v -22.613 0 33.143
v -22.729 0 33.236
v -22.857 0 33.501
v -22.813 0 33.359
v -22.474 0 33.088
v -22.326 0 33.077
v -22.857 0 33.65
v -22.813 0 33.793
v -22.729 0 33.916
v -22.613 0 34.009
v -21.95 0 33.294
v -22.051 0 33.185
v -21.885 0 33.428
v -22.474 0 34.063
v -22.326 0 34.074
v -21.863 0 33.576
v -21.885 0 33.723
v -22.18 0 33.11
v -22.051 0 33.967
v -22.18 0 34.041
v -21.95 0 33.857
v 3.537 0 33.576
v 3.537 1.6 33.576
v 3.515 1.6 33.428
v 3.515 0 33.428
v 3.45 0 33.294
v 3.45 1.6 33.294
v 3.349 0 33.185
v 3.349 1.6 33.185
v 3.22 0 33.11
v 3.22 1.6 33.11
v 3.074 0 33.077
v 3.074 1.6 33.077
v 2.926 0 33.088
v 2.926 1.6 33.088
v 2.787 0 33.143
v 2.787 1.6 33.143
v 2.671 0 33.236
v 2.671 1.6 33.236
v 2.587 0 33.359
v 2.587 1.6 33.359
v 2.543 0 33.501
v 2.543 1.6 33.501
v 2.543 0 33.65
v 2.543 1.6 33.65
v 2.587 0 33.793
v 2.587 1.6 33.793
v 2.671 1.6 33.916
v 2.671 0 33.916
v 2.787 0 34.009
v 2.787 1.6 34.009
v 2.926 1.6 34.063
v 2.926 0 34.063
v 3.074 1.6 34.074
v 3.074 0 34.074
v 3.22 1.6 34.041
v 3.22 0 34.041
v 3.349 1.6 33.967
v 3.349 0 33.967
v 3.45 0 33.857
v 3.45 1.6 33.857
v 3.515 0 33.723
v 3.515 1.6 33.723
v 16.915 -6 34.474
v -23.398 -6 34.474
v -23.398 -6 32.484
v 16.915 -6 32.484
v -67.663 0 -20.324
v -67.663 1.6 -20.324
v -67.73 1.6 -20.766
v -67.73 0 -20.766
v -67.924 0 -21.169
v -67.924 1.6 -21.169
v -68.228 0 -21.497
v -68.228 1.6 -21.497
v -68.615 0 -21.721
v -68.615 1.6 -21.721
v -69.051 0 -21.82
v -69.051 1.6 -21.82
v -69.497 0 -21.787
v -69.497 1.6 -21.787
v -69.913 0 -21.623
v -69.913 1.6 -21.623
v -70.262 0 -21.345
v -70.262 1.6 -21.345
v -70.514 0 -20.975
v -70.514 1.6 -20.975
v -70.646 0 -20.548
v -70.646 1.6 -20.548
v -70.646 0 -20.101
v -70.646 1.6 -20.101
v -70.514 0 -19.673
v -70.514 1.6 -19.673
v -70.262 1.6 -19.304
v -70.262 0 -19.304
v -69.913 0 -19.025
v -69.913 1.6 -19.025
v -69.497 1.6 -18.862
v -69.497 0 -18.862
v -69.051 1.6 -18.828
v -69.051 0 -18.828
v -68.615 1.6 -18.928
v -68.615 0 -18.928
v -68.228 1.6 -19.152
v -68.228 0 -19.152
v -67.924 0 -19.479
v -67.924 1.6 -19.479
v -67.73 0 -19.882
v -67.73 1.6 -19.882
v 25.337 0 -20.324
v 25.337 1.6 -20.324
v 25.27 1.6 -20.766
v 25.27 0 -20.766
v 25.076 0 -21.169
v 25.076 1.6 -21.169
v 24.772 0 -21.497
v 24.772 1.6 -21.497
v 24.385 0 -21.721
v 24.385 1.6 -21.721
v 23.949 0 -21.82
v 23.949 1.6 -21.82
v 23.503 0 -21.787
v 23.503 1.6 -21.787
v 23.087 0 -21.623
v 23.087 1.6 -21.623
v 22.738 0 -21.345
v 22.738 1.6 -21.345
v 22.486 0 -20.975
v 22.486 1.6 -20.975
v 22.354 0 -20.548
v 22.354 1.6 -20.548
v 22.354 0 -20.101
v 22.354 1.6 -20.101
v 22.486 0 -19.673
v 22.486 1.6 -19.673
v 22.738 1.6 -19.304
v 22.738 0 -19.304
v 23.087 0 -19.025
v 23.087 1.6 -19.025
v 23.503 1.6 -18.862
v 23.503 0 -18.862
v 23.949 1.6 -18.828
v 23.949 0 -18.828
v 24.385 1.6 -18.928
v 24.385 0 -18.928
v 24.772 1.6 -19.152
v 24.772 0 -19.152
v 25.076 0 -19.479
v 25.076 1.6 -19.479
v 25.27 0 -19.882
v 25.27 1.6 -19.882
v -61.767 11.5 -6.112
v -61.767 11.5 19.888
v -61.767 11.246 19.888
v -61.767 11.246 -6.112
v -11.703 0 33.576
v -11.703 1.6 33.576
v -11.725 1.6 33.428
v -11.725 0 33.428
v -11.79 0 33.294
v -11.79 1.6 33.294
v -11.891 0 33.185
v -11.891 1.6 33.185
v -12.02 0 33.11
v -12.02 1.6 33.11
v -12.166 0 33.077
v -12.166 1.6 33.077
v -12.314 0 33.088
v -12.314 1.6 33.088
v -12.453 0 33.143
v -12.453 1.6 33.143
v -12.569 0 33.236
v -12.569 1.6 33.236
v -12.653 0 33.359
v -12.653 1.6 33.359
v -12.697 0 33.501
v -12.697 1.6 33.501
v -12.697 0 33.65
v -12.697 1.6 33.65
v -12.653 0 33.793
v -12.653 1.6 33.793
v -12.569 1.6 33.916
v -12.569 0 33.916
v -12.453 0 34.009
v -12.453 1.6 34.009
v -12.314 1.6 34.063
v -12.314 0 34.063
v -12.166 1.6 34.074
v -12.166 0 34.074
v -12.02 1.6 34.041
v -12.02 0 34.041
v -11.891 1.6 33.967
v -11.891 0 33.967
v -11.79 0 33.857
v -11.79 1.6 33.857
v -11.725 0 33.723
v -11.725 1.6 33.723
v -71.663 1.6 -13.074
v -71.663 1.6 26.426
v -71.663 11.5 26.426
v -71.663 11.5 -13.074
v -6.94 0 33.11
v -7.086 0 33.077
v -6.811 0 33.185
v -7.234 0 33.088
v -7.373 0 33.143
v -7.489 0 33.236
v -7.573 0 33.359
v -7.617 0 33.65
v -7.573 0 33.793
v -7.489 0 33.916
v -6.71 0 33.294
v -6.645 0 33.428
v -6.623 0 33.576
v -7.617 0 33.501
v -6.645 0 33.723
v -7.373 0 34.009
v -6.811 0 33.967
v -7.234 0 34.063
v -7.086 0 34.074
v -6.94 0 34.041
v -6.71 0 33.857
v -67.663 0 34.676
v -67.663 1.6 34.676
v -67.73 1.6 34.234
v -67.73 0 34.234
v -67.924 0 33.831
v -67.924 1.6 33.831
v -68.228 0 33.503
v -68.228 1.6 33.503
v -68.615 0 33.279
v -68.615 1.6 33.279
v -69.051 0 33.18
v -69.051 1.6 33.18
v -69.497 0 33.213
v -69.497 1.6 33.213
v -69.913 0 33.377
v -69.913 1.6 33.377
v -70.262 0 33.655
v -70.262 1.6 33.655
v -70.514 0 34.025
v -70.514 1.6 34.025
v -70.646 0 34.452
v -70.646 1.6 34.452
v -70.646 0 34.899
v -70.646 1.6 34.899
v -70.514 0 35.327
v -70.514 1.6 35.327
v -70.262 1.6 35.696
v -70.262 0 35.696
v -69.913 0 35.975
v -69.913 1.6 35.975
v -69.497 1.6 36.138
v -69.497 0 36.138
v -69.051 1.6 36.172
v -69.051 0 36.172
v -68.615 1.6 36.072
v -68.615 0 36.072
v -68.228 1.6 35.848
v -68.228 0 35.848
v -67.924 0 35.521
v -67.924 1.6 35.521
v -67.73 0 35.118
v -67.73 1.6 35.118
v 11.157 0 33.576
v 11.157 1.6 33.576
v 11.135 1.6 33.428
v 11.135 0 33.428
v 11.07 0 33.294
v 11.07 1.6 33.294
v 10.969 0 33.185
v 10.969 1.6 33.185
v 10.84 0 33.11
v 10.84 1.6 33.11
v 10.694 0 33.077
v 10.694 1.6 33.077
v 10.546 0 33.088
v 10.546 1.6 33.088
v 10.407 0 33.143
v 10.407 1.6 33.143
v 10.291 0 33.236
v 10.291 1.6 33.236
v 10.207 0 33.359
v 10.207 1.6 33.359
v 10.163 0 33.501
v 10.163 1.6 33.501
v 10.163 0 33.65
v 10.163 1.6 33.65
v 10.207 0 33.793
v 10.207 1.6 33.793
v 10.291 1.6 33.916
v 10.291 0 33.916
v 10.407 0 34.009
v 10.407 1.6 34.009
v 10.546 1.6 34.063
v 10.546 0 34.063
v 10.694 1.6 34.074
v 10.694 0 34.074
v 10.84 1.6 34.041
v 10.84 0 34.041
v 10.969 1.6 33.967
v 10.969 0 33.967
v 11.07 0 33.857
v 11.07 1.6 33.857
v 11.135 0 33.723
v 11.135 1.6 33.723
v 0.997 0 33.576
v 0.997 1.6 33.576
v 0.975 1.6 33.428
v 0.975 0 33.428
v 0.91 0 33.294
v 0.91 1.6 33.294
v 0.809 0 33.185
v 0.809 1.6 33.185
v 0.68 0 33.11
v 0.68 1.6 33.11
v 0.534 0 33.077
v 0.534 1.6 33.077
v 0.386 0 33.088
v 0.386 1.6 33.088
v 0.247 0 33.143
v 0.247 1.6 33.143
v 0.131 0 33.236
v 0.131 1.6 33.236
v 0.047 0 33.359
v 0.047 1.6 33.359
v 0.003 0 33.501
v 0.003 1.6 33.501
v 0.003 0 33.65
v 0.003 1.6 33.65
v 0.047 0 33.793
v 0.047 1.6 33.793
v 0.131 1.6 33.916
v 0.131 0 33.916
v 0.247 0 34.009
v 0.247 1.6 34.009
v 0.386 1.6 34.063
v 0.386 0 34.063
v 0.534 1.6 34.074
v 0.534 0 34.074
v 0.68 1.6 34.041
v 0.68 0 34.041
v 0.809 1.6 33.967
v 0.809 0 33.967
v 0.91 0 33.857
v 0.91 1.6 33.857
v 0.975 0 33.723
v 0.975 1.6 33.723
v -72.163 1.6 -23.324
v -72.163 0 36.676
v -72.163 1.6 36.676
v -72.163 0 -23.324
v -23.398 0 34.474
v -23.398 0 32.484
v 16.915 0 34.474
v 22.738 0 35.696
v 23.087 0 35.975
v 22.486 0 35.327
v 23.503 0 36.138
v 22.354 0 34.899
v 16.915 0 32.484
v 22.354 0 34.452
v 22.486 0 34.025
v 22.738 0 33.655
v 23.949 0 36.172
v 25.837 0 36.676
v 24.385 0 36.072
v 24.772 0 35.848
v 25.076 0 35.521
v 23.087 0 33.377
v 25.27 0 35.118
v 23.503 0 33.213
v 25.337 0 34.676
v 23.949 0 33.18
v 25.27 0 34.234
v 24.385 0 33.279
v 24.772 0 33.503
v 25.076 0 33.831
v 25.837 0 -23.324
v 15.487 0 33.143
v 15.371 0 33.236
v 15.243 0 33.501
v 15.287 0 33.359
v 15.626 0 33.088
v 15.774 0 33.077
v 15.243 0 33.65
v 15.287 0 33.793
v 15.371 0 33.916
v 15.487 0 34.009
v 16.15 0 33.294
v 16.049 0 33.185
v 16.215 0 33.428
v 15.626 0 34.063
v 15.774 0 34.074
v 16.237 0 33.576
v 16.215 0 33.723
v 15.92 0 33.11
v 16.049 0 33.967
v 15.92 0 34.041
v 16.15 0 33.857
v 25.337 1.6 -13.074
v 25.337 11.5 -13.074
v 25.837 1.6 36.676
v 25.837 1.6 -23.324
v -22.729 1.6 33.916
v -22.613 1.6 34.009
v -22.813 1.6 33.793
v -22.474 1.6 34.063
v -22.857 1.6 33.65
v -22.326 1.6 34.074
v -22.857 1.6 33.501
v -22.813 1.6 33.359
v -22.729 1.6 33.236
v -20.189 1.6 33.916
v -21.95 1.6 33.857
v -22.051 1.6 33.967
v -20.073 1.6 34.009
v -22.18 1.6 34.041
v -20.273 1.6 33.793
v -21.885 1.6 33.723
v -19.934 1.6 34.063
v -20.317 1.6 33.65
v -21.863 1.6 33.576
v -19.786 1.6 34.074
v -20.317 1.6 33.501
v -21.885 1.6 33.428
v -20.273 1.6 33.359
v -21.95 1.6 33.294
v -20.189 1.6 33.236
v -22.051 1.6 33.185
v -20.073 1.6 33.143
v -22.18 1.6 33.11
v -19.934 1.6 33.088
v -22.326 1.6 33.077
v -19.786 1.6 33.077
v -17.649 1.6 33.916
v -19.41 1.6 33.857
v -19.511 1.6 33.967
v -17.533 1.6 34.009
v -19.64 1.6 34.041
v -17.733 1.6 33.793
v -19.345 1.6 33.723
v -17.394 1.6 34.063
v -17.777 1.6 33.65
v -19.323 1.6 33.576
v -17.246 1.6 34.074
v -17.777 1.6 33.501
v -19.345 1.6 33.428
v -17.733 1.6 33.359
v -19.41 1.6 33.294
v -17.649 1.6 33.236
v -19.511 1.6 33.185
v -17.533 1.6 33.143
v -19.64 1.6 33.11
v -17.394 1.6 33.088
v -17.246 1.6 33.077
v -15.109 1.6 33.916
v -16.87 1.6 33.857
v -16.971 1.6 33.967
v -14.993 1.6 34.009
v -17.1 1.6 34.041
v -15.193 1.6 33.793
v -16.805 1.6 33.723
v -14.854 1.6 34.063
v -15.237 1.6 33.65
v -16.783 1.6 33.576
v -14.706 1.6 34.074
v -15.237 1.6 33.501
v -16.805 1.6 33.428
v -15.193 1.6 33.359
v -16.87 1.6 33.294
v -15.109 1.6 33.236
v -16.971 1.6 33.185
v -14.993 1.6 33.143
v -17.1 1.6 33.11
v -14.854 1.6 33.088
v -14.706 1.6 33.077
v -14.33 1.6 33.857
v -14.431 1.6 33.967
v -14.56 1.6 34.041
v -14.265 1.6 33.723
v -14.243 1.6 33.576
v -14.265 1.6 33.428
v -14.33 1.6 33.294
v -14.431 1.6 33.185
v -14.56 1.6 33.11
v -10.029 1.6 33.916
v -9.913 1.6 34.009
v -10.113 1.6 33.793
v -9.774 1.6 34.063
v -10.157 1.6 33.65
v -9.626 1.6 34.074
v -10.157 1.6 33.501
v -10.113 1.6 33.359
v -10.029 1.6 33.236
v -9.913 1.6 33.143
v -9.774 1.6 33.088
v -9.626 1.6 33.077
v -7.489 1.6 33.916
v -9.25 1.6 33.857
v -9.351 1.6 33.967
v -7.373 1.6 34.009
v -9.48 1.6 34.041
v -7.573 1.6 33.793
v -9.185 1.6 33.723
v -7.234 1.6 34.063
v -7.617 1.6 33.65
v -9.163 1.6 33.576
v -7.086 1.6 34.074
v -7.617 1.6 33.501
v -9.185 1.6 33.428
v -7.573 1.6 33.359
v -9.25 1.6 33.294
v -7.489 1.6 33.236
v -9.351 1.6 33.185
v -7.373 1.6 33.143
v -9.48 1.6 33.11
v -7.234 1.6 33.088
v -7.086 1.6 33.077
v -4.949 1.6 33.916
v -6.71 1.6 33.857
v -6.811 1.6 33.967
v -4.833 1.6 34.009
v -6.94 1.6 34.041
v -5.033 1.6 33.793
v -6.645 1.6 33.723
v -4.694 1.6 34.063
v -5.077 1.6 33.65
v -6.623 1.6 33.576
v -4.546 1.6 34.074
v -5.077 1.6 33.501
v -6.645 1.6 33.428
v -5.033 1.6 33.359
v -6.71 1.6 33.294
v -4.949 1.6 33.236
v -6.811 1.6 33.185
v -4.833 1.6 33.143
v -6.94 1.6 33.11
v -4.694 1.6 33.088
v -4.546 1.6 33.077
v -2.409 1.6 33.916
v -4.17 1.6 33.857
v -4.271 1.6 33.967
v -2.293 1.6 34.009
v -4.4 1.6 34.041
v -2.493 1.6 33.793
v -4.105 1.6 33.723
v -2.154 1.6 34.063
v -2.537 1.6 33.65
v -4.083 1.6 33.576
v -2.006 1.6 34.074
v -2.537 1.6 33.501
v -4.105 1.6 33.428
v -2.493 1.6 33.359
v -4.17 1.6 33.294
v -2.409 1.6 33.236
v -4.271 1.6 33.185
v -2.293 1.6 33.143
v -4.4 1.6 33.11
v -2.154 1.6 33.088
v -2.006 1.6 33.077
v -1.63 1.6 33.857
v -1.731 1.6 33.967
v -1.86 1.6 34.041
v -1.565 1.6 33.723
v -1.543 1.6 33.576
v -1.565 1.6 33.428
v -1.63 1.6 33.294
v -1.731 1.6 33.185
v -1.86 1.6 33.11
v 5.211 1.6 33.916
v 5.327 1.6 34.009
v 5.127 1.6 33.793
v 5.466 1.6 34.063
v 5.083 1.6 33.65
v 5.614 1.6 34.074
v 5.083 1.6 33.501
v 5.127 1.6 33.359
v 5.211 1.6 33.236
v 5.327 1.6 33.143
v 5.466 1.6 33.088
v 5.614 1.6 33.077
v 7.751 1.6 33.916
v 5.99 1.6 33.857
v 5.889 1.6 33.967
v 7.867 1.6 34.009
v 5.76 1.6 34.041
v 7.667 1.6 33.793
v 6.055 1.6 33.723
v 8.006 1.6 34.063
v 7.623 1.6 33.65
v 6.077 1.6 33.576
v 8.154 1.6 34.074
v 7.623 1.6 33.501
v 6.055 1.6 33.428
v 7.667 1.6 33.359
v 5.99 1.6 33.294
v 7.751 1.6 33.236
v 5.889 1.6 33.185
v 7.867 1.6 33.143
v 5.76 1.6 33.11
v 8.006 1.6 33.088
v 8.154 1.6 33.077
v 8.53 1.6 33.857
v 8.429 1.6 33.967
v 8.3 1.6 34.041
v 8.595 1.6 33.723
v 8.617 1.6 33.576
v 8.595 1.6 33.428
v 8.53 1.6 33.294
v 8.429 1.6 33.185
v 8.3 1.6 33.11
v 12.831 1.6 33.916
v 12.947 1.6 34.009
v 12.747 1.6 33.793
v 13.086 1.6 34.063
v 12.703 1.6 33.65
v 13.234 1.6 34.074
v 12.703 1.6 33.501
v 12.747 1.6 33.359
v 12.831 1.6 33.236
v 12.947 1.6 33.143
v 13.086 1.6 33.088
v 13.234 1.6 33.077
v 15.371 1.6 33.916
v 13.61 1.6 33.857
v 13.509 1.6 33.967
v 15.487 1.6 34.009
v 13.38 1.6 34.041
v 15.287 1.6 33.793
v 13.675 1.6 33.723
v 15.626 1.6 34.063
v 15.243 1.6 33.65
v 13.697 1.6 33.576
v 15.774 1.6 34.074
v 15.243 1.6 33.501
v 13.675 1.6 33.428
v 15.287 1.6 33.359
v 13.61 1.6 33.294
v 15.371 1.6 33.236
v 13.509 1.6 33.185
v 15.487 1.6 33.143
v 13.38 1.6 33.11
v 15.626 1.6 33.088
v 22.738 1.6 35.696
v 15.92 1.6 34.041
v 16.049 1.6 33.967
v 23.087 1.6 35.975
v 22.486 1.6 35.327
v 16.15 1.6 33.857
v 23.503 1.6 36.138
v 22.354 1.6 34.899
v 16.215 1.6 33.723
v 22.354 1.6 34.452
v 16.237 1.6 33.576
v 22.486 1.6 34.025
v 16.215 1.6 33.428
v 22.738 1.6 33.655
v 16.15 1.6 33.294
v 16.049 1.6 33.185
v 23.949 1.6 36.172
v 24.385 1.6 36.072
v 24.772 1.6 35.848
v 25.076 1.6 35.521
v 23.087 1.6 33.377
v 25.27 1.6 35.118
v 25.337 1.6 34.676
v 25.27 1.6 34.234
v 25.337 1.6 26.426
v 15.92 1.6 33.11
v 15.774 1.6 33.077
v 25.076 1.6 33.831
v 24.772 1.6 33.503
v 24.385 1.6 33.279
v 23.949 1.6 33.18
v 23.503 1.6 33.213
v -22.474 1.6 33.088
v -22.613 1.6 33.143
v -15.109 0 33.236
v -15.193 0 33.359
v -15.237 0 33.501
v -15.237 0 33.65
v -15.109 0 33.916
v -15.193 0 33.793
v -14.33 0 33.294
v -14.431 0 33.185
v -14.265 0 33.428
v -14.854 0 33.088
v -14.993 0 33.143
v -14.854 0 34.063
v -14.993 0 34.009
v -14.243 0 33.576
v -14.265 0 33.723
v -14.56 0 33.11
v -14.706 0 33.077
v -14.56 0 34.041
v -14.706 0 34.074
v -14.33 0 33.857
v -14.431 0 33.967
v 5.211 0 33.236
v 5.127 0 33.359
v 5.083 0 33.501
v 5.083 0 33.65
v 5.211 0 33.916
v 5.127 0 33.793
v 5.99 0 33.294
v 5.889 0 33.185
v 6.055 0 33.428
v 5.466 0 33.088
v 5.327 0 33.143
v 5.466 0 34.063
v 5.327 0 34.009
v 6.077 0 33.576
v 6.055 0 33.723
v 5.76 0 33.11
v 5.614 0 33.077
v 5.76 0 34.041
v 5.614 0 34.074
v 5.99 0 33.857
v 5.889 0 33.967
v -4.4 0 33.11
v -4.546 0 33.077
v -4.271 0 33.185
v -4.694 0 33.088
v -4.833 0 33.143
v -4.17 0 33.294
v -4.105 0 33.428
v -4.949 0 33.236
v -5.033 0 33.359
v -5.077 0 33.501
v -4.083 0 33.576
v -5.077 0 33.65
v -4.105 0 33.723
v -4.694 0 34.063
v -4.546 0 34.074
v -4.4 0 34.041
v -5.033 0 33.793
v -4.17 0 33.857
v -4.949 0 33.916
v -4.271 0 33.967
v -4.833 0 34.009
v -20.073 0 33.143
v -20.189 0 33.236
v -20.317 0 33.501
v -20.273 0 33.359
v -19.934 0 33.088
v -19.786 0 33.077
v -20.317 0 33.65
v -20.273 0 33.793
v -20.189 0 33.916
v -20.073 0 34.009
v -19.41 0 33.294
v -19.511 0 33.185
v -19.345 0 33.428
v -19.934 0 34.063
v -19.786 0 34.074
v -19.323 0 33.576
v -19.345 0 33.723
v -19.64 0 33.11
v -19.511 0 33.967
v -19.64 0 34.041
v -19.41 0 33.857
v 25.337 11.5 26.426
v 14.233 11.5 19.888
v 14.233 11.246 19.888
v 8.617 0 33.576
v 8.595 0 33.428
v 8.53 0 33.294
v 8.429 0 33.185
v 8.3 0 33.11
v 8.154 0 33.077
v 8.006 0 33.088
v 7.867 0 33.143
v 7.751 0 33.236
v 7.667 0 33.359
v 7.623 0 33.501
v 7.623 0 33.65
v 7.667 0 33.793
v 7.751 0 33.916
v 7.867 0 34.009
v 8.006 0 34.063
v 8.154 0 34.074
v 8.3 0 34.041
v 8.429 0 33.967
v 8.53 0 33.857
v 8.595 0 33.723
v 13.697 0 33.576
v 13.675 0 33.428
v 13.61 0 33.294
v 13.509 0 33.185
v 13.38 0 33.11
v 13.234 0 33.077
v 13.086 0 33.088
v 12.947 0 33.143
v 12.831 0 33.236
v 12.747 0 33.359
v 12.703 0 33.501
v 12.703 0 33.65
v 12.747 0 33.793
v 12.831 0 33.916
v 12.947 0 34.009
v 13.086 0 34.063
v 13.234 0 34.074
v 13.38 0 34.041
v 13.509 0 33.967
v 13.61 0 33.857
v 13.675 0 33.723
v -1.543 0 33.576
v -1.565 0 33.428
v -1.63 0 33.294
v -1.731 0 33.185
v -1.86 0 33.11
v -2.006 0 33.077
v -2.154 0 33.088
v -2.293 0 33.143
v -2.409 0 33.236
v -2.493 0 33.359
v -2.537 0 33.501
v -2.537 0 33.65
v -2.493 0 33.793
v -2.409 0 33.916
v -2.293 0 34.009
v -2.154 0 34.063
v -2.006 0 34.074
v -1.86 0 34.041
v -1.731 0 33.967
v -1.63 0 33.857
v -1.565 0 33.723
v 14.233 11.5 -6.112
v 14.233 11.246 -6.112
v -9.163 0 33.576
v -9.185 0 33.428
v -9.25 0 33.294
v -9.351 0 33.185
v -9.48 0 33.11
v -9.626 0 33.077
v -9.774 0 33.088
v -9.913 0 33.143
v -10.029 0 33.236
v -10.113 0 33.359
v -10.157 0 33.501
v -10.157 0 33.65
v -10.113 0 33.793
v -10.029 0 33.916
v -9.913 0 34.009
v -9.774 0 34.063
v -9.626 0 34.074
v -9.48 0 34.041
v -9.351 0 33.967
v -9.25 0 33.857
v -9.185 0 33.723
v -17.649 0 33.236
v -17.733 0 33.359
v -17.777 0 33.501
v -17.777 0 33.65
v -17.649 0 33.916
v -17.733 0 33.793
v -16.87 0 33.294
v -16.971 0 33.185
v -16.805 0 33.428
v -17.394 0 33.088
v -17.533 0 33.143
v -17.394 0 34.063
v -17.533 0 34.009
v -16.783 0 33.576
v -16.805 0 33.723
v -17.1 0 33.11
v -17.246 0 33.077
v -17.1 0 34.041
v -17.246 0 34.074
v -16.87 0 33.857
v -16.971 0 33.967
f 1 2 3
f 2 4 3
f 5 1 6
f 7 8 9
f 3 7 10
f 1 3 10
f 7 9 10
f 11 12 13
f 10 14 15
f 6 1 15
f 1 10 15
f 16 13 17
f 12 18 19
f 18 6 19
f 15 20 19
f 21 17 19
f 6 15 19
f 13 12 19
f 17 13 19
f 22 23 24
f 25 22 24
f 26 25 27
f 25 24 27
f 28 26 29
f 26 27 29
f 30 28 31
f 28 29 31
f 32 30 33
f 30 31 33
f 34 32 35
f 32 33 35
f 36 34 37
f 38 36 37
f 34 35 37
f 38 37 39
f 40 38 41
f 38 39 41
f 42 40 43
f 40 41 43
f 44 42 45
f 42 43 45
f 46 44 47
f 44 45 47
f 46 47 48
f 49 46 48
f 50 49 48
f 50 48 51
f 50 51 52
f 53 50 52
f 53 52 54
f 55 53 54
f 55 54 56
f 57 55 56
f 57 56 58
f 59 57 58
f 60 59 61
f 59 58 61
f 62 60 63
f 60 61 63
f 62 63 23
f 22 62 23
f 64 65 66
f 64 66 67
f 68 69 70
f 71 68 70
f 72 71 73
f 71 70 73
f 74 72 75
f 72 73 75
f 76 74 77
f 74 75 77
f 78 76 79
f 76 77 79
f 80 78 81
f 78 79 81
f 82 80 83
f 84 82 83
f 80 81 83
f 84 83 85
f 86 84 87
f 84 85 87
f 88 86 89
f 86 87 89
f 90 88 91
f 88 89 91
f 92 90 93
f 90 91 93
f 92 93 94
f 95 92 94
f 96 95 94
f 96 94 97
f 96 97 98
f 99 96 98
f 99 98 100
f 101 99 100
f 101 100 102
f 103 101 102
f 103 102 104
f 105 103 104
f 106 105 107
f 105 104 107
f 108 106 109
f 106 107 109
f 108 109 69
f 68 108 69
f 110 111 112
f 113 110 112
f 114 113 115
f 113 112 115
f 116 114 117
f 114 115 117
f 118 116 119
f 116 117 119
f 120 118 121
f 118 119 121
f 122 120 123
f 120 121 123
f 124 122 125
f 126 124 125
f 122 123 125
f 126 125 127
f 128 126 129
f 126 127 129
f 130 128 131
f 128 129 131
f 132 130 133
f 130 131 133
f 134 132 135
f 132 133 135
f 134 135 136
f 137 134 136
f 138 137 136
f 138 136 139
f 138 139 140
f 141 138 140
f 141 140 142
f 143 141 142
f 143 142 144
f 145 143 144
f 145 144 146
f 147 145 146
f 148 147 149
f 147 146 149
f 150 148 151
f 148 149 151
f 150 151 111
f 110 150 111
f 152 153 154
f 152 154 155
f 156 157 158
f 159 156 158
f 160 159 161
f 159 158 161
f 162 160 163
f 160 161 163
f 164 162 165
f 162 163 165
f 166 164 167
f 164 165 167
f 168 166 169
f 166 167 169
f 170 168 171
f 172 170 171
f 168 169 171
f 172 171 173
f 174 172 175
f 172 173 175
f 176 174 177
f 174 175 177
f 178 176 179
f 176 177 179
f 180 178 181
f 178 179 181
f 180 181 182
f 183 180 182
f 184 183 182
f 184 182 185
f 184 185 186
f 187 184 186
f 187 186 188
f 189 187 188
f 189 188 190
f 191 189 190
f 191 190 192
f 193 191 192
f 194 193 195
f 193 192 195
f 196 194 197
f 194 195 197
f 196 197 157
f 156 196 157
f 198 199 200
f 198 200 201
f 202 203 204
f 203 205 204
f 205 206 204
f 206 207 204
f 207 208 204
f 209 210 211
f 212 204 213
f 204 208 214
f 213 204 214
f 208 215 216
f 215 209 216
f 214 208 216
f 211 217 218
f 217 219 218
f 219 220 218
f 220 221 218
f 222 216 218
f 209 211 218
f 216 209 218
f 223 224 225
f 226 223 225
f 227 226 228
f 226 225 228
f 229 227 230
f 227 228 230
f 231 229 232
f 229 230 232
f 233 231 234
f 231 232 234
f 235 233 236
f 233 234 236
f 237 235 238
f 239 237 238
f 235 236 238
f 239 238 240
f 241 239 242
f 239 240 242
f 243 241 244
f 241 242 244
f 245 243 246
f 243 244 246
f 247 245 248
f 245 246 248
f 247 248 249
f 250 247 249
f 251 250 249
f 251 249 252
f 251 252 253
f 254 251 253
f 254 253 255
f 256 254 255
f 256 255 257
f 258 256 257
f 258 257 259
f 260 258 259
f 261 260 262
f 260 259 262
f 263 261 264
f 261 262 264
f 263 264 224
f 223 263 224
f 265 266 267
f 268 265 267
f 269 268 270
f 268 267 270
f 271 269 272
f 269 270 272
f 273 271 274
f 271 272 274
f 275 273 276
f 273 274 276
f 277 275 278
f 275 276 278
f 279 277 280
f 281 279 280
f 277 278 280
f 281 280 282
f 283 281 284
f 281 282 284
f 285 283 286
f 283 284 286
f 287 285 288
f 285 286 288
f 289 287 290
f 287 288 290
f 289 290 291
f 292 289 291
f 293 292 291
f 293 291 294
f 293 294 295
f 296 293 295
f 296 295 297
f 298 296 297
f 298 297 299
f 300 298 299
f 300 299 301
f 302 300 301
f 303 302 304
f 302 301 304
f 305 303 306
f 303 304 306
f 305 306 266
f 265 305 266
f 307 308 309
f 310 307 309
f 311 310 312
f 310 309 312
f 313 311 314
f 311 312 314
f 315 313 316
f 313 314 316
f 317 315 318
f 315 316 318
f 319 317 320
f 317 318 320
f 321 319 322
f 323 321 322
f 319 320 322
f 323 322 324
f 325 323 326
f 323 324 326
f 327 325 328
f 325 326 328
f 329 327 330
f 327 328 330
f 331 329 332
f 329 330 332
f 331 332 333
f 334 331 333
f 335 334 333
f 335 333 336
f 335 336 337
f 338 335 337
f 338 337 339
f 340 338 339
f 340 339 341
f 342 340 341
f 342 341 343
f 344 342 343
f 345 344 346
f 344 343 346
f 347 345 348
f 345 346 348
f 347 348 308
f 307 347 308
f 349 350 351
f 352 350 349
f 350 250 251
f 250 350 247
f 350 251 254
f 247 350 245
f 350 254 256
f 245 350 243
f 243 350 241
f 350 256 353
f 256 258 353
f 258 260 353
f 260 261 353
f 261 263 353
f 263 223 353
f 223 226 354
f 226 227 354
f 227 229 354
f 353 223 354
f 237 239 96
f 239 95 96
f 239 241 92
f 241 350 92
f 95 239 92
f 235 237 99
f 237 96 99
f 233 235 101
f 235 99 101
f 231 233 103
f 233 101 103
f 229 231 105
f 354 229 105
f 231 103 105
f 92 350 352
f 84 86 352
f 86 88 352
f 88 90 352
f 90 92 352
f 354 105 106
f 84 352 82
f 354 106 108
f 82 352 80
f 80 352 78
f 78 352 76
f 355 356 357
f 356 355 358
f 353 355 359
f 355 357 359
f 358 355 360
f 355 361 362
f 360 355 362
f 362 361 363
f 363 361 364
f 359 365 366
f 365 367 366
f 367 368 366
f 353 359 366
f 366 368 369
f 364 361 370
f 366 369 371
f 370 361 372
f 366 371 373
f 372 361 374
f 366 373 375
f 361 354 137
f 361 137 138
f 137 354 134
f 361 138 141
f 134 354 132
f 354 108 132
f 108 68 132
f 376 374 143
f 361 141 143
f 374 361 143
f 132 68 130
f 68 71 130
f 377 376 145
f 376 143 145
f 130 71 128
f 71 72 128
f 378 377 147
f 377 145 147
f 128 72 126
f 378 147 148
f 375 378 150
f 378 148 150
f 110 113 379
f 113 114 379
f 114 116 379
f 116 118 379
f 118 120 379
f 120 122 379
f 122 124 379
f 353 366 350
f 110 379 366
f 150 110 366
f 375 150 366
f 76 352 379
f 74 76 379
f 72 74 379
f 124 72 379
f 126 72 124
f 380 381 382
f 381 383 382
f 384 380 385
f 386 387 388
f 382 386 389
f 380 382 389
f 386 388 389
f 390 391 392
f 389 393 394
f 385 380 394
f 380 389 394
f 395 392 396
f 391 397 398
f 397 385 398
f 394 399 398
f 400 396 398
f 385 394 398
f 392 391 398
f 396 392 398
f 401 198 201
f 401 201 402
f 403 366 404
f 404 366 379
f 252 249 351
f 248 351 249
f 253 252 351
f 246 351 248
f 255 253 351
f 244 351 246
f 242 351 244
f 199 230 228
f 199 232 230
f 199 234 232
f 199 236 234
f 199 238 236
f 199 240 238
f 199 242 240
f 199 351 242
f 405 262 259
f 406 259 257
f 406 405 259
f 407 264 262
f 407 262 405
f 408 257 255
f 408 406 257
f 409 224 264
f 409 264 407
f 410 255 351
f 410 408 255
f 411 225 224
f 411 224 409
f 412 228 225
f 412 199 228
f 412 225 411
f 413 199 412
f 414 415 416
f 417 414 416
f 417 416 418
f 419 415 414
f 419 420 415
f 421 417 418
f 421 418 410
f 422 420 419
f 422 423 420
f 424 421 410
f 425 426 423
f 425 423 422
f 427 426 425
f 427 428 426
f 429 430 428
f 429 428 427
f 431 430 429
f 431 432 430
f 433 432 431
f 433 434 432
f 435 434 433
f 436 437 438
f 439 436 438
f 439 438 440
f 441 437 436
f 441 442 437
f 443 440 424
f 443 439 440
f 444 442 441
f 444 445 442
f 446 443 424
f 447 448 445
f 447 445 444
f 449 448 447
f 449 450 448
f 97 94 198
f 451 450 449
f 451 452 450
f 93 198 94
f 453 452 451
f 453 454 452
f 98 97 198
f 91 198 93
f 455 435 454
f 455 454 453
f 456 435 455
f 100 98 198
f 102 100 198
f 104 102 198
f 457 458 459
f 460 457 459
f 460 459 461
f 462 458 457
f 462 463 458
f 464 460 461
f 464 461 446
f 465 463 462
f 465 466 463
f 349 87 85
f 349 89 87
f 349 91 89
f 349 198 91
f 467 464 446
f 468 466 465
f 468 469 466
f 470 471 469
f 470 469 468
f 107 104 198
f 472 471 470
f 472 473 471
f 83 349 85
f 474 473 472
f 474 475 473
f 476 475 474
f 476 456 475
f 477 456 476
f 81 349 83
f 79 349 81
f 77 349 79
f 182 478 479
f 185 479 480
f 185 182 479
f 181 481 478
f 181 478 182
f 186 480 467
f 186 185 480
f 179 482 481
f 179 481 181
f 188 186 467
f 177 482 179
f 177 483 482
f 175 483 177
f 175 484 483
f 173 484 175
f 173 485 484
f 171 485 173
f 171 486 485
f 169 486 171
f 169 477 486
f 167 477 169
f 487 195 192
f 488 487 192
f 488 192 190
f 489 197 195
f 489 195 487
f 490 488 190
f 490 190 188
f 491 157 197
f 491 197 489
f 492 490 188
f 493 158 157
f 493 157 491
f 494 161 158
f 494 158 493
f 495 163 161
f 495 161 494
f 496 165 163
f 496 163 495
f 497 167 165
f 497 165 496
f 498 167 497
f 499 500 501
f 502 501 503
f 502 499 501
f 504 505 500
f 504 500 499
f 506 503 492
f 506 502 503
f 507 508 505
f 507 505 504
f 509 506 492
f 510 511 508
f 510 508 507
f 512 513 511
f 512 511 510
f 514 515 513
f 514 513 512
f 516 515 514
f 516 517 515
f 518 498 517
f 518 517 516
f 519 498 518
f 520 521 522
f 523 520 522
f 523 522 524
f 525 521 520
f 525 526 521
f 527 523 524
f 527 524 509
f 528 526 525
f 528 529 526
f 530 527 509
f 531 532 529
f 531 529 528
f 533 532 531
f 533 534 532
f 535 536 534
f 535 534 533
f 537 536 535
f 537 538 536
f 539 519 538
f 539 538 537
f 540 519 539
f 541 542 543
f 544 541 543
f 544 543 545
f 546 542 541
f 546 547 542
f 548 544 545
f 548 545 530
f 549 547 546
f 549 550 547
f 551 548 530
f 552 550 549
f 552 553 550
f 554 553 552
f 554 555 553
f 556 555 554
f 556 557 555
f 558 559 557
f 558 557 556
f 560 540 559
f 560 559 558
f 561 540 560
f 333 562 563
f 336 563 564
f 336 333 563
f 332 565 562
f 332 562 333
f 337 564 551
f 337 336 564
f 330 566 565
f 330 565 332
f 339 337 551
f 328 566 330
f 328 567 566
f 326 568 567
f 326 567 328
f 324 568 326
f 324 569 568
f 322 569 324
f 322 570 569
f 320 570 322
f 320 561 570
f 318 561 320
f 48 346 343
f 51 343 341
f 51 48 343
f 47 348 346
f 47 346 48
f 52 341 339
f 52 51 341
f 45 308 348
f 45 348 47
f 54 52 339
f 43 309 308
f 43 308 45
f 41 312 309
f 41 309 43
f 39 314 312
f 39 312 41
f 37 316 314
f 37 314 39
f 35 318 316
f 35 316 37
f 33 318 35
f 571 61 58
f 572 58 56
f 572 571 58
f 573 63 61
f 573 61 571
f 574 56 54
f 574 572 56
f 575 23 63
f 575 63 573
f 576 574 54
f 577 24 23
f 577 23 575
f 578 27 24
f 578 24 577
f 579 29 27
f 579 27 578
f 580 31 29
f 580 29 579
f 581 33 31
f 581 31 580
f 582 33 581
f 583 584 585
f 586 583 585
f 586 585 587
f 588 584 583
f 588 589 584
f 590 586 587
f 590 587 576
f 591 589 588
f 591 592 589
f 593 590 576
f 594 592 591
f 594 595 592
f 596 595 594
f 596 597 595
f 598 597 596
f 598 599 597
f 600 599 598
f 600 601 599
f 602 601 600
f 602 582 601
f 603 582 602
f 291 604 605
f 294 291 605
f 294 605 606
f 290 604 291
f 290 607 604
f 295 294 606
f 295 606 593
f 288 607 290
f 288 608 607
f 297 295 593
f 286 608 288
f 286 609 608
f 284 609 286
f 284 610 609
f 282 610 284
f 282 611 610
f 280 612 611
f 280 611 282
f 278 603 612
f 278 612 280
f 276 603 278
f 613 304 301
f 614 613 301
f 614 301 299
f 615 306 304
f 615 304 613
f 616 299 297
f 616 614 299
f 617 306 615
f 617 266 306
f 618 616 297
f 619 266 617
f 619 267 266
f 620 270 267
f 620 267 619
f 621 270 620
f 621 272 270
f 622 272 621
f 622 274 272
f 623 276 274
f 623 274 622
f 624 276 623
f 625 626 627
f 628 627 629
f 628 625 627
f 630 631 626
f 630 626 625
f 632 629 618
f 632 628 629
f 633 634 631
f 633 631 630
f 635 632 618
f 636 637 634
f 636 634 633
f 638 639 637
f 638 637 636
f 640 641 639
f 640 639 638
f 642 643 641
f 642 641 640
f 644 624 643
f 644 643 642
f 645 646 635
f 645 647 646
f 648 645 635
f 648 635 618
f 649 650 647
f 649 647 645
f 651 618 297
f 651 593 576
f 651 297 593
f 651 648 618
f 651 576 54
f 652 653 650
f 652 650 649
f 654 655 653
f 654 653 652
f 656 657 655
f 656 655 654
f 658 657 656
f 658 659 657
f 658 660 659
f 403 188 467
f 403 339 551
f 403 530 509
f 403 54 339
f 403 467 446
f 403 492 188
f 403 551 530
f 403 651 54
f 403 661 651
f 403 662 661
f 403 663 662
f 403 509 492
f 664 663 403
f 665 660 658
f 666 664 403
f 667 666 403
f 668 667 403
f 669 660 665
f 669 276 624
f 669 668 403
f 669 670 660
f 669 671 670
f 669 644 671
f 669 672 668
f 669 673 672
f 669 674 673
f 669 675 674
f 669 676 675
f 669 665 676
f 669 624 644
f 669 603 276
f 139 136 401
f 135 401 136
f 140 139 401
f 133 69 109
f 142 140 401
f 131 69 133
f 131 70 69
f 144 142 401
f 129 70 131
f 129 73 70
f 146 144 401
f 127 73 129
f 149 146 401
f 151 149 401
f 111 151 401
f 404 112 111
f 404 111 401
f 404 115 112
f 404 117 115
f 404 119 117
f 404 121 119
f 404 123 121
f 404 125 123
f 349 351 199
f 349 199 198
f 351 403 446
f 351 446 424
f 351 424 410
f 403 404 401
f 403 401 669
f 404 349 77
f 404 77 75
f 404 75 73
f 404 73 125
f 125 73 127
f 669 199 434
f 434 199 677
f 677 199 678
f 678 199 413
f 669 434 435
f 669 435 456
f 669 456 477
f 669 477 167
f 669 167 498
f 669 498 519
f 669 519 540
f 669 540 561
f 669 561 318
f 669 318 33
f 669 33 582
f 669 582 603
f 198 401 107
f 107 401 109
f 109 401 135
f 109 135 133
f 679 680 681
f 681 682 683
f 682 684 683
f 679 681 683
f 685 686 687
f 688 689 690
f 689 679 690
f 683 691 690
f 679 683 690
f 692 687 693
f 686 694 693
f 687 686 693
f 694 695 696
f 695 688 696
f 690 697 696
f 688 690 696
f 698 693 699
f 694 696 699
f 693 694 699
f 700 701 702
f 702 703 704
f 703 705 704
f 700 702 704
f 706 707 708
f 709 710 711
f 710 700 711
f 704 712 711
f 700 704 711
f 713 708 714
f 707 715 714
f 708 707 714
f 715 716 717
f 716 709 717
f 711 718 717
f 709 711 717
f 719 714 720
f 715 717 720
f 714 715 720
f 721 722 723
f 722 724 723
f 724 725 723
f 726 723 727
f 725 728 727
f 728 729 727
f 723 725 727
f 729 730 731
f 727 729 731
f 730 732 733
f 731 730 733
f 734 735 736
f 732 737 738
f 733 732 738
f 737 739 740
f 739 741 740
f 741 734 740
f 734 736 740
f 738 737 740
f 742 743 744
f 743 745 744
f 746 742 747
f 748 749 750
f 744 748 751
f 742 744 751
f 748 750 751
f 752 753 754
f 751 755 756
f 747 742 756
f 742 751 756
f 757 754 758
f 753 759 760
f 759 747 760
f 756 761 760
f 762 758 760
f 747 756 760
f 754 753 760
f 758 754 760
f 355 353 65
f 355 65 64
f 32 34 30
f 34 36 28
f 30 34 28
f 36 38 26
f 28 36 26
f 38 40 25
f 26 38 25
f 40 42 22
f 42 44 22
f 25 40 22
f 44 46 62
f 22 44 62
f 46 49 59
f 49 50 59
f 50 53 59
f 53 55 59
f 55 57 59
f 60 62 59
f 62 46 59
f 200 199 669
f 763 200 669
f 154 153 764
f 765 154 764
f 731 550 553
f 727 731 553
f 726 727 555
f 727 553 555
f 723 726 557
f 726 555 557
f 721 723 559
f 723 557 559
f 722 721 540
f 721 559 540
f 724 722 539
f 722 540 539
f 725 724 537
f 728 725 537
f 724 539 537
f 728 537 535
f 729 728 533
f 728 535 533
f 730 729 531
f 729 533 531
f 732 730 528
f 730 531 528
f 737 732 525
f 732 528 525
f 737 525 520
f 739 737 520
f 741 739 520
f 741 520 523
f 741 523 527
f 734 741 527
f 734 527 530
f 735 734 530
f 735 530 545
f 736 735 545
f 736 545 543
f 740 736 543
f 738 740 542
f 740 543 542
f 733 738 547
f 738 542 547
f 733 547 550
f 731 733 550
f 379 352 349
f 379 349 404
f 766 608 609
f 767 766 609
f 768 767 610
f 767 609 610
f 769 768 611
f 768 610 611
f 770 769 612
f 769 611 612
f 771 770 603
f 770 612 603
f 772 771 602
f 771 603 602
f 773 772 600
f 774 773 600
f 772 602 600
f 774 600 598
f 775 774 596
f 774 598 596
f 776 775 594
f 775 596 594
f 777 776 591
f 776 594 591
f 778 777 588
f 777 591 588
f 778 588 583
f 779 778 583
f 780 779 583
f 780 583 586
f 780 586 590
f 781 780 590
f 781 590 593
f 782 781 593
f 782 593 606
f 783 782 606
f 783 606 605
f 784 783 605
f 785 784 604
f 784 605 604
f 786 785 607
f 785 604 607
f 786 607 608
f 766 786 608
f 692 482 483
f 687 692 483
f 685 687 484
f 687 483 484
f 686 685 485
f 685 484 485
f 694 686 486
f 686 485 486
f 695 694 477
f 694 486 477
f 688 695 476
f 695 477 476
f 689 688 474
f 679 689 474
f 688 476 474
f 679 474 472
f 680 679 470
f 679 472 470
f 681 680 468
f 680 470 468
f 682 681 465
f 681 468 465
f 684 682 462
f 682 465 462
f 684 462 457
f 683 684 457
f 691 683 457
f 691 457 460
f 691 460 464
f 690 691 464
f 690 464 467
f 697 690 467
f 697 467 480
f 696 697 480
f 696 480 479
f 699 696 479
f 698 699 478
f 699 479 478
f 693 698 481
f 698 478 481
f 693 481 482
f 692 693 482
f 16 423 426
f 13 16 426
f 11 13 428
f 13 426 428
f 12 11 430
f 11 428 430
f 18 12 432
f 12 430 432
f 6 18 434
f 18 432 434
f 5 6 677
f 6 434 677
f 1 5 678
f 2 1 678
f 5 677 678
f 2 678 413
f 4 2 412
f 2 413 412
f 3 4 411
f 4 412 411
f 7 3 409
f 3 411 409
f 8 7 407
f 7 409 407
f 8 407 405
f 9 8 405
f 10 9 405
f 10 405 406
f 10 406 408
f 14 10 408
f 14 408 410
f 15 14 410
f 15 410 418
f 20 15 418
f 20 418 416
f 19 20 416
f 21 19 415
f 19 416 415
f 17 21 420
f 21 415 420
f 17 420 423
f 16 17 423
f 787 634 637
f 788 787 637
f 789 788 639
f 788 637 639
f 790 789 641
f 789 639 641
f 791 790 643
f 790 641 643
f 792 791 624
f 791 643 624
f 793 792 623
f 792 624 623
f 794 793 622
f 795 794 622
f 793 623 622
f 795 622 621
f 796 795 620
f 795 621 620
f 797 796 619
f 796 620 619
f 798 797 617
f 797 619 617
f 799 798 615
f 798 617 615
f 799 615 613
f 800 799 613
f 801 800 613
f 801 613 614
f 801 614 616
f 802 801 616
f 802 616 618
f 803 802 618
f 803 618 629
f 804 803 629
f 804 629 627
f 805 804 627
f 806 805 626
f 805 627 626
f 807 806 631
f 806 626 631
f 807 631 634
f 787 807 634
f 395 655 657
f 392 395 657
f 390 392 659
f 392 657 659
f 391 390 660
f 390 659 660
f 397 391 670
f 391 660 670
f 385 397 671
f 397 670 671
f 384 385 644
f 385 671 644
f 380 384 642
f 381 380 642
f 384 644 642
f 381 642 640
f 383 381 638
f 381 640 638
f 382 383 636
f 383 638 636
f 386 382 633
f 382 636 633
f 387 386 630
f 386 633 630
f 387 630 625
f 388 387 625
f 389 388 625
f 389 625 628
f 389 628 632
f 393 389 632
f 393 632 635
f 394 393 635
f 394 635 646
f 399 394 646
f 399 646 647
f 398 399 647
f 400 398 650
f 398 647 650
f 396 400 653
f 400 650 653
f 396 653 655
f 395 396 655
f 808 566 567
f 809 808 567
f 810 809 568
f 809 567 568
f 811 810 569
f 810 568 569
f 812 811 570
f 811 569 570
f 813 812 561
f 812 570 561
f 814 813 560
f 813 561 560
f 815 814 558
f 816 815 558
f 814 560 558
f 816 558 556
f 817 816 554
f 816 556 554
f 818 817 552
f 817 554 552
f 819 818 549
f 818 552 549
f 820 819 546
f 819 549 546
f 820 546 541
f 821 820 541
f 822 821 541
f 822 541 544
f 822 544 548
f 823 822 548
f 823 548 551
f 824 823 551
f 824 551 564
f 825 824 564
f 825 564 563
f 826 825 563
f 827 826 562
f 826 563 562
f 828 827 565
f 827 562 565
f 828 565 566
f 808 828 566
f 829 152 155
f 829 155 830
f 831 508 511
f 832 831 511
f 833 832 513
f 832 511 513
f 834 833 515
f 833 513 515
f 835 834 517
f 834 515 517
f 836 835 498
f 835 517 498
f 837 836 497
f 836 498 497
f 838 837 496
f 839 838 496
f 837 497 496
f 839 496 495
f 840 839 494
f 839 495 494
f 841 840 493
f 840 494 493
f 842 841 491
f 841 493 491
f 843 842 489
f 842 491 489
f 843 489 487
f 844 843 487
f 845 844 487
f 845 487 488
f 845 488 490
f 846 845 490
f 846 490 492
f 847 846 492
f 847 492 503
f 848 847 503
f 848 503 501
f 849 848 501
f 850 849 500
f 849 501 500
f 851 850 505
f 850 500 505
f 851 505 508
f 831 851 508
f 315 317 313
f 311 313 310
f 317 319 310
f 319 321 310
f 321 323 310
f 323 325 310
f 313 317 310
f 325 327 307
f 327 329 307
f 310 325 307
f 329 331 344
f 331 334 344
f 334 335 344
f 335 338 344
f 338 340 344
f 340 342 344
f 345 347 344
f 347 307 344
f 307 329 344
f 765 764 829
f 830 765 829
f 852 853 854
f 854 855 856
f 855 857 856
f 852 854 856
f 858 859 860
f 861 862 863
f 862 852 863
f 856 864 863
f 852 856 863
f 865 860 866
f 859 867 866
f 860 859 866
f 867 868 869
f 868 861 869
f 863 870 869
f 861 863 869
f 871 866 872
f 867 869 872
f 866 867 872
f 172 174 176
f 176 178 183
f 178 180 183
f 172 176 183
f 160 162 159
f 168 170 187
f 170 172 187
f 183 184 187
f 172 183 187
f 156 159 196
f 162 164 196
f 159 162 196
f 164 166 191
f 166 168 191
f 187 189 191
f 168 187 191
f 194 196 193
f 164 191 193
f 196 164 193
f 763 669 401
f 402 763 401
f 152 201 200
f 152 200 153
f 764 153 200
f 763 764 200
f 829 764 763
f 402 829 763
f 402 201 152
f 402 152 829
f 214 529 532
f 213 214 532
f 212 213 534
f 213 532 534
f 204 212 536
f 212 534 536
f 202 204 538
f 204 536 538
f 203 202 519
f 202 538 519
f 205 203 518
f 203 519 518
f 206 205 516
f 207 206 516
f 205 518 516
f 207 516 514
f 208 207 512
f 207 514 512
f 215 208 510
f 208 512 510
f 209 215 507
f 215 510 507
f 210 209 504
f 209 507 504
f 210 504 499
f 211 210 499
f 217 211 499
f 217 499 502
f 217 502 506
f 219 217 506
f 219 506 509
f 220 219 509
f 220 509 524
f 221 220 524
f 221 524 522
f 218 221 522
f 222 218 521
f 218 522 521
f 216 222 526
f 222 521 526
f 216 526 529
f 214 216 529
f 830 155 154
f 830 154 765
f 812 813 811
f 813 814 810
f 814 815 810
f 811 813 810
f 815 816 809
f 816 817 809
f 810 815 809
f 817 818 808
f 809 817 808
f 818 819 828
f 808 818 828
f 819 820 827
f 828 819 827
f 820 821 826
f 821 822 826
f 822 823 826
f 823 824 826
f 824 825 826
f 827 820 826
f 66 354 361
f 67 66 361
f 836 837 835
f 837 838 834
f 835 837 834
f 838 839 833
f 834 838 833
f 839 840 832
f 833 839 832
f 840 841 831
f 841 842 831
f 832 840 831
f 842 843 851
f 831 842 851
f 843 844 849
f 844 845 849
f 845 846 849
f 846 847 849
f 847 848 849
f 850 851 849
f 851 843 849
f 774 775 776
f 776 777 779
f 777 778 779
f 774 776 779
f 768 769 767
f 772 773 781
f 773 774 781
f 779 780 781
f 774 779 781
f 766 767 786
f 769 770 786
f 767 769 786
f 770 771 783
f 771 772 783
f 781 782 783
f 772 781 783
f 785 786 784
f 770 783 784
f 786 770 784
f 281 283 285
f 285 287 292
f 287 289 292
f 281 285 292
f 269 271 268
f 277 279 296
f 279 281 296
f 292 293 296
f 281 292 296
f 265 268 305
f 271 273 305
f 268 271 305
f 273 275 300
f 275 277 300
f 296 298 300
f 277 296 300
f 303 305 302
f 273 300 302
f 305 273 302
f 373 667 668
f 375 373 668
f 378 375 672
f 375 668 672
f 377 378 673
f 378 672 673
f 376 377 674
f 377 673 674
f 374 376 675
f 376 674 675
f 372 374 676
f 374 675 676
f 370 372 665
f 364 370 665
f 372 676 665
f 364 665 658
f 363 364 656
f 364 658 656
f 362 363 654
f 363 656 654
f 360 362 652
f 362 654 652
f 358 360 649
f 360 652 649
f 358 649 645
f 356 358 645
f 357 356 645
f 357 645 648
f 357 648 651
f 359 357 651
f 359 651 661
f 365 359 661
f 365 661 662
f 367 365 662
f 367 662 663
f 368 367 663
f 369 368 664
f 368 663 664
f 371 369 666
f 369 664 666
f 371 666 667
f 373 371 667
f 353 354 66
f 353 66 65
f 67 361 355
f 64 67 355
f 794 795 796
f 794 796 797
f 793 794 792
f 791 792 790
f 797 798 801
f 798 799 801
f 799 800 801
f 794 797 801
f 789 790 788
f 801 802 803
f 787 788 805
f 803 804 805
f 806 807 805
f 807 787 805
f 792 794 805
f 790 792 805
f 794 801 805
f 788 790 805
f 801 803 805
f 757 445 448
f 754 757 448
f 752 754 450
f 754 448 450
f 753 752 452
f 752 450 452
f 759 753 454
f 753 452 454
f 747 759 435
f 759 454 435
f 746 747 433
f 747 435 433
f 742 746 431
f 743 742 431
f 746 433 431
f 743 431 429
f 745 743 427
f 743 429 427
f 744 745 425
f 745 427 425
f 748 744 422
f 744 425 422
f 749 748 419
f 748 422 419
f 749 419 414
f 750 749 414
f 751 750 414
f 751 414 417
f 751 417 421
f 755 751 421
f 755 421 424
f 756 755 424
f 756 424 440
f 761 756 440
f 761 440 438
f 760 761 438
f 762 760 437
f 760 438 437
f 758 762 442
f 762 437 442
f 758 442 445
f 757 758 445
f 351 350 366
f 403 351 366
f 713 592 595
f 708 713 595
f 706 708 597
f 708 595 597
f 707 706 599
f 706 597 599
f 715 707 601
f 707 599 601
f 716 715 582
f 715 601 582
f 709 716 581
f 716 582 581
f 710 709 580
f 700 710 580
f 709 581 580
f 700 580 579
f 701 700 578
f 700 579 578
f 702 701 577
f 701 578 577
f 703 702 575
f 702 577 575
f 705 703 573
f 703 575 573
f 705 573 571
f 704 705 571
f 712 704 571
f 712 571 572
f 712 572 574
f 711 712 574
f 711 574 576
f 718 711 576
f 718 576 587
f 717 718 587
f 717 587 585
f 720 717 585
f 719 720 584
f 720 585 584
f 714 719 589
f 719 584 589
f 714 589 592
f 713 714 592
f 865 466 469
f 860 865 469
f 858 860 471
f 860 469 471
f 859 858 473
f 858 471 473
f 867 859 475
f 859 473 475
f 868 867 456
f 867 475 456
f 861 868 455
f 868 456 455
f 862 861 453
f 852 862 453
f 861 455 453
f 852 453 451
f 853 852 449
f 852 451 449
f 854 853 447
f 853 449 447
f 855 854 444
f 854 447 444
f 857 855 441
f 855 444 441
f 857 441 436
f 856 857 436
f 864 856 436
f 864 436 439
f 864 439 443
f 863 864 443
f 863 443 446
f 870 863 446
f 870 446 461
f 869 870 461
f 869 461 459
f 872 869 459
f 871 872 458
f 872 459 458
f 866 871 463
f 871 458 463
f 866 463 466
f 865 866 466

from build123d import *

# Parameters (mm, degrees)
SKETCH1_W           = 98
SKETCH1_H           = 60
BOSS_EXTRUDE1_DEPTH = 1.6
SKETCH2_W           = 97
SKETCH2_H           = 39.5
BOSS_EXTRUDE2_DEPTH = 9.9
SKETCH4_R           = 1.5
CUT_EXTRUDE1_DEPTH  = 1.6
SKETCH5_R           = 0.5
CUT_EXTRUDE2_DEPTH  = 1.6
SKETCH6_W           = 40.313195669
SKETCH6_H           = 1.990775095
BOSS_EXTRUDE3_DEPTH = 6
SKETCH3_W           = 76
SKETCH3_H           = 26
CUT_EXTRUDE3_DEPTH  = 0.254


with BuildPart() as part:
    # Sketch1 → Boss-Extrude1 (new body)
    with BuildSketch(Plane(origin=(0, 0, 0), x_dir=(1, 0, 0), z_dir=(0, 1, 0))):
        with Locations((-23.16287695, -6.675720991)):
            Rectangle(SKETCH1_W, SKETCH1_H)
    extrude(amount=BOSS_EXTRUDE1_DEPTH)

    # Sketch2 → Boss-Extrude2 (add)
    with BuildSketch(Plane(origin=(0, 1.6, 0), x_dir=(1, 0, 0), z_dir=(0, 1, 0))):
        with Locations((-23.16287695, -6.675720991)):
            Rectangle(SKETCH2_W, SKETCH2_H)
    extrude(amount=BOSS_EXTRUDE2_DEPTH)

    # Sketch4 → Cut-Extrude1 (cut)
    with BuildSketch(Plane(origin=(0, 1.6, 0), x_dir=(1, 0, 0), z_dir=(0, 1, 0))):
        with Locations((-69.16287695, -34.675720991)):
            Circle(SKETCH4_R)
        with Locations((23.83712305, -34.675720991)):
            Circle(SKETCH4_R)
        with Locations((-69.16287695, 20.324279009)):
            Circle(SKETCH4_R)
        with Locations((23.83712305, 20.324279009)):
            Circle(SKETCH4_R)
    extrude(amount=-CUT_EXTRUDE1_DEPTH, mode=Mode.SUBTRACT)

    # Sketch5 → Cut-Extrude2 (cut)
    with BuildSketch(Plane(origin=(0, 1.6, 0), x_dir=(1, 0, 0), z_dir=(0, 1, 0))):
        with Locations((15.73712305, -33.575720991)):
            Circle(SKETCH5_R)
        with Locations((13.19712305, -33.575720991)):
            Circle(SKETCH5_R)
        with Locations((10.65712305, -33.575720991)):
            Circle(SKETCH5_R)
        with Locations((8.11712305, -33.575720991)):
            Circle(SKETCH5_R)
        with Locations((5.57712305, -33.575720991)):
            Circle(SKETCH5_R)
        with Locations((3.03712305, -33.575720991)):
            Circle(SKETCH5_R)
        with Locations((0.49712305, -33.575720991)):
            Circle(SKETCH5_R)
        with Locations((-2.04287695, -33.575720991)):
            Circle(SKETCH5_R)
        with Locations((-4.58287695, -33.575720991)):
            Circle(SKETCH5_R)
        with Locations((-7.12287695, -33.575720991)):
            Circle(SKETCH5_R)
        with Locations((-9.66287695, -33.575720991)):
            Circle(SKETCH5_R)
        with Locations((-12.20287695, -33.575720991)):
            Circle(SKETCH5_R)
        with Locations((-14.74287695, -33.575720991)):
            Circle(SKETCH5_R)
        with Locations((-17.28287695, -33.575720991)):
            Circle(SKETCH5_R)
        with Locations((-19.82287695, -33.575720991)):
            Circle(SKETCH5_R)
        with Locations((-22.36287695, -33.575720991)):
            Circle(SKETCH5_R)
    extrude(amount=-CUT_EXTRUDE2_DEPTH, mode=Mode.SUBTRACT)

    # Sketch6 → Boss-Extrude3 (add)
    with BuildSketch(Plane.XZ):
        with Locations((-3.241605768, 33.478976188)):
            Rectangle(SKETCH6_W, SKETCH6_H)
    extrude(amount=BOSS_EXTRUDE3_DEPTH)

    # Sketch3 → Cut-Extrude3 (cut)
    with BuildSketch(Plane(origin=(0, 11.5, 0), x_dir=(1, 0, 0), z_dir=(0, 1, 0))):
        with Locations((-23.766549937, -6.888251248)):
            Rectangle(SKETCH3_W, SKETCH3_H)
    extrude(amount=-CUT_EXTRUDE3_DEPTH, mode=Mode.SUBTRACT)


solid = part.part
